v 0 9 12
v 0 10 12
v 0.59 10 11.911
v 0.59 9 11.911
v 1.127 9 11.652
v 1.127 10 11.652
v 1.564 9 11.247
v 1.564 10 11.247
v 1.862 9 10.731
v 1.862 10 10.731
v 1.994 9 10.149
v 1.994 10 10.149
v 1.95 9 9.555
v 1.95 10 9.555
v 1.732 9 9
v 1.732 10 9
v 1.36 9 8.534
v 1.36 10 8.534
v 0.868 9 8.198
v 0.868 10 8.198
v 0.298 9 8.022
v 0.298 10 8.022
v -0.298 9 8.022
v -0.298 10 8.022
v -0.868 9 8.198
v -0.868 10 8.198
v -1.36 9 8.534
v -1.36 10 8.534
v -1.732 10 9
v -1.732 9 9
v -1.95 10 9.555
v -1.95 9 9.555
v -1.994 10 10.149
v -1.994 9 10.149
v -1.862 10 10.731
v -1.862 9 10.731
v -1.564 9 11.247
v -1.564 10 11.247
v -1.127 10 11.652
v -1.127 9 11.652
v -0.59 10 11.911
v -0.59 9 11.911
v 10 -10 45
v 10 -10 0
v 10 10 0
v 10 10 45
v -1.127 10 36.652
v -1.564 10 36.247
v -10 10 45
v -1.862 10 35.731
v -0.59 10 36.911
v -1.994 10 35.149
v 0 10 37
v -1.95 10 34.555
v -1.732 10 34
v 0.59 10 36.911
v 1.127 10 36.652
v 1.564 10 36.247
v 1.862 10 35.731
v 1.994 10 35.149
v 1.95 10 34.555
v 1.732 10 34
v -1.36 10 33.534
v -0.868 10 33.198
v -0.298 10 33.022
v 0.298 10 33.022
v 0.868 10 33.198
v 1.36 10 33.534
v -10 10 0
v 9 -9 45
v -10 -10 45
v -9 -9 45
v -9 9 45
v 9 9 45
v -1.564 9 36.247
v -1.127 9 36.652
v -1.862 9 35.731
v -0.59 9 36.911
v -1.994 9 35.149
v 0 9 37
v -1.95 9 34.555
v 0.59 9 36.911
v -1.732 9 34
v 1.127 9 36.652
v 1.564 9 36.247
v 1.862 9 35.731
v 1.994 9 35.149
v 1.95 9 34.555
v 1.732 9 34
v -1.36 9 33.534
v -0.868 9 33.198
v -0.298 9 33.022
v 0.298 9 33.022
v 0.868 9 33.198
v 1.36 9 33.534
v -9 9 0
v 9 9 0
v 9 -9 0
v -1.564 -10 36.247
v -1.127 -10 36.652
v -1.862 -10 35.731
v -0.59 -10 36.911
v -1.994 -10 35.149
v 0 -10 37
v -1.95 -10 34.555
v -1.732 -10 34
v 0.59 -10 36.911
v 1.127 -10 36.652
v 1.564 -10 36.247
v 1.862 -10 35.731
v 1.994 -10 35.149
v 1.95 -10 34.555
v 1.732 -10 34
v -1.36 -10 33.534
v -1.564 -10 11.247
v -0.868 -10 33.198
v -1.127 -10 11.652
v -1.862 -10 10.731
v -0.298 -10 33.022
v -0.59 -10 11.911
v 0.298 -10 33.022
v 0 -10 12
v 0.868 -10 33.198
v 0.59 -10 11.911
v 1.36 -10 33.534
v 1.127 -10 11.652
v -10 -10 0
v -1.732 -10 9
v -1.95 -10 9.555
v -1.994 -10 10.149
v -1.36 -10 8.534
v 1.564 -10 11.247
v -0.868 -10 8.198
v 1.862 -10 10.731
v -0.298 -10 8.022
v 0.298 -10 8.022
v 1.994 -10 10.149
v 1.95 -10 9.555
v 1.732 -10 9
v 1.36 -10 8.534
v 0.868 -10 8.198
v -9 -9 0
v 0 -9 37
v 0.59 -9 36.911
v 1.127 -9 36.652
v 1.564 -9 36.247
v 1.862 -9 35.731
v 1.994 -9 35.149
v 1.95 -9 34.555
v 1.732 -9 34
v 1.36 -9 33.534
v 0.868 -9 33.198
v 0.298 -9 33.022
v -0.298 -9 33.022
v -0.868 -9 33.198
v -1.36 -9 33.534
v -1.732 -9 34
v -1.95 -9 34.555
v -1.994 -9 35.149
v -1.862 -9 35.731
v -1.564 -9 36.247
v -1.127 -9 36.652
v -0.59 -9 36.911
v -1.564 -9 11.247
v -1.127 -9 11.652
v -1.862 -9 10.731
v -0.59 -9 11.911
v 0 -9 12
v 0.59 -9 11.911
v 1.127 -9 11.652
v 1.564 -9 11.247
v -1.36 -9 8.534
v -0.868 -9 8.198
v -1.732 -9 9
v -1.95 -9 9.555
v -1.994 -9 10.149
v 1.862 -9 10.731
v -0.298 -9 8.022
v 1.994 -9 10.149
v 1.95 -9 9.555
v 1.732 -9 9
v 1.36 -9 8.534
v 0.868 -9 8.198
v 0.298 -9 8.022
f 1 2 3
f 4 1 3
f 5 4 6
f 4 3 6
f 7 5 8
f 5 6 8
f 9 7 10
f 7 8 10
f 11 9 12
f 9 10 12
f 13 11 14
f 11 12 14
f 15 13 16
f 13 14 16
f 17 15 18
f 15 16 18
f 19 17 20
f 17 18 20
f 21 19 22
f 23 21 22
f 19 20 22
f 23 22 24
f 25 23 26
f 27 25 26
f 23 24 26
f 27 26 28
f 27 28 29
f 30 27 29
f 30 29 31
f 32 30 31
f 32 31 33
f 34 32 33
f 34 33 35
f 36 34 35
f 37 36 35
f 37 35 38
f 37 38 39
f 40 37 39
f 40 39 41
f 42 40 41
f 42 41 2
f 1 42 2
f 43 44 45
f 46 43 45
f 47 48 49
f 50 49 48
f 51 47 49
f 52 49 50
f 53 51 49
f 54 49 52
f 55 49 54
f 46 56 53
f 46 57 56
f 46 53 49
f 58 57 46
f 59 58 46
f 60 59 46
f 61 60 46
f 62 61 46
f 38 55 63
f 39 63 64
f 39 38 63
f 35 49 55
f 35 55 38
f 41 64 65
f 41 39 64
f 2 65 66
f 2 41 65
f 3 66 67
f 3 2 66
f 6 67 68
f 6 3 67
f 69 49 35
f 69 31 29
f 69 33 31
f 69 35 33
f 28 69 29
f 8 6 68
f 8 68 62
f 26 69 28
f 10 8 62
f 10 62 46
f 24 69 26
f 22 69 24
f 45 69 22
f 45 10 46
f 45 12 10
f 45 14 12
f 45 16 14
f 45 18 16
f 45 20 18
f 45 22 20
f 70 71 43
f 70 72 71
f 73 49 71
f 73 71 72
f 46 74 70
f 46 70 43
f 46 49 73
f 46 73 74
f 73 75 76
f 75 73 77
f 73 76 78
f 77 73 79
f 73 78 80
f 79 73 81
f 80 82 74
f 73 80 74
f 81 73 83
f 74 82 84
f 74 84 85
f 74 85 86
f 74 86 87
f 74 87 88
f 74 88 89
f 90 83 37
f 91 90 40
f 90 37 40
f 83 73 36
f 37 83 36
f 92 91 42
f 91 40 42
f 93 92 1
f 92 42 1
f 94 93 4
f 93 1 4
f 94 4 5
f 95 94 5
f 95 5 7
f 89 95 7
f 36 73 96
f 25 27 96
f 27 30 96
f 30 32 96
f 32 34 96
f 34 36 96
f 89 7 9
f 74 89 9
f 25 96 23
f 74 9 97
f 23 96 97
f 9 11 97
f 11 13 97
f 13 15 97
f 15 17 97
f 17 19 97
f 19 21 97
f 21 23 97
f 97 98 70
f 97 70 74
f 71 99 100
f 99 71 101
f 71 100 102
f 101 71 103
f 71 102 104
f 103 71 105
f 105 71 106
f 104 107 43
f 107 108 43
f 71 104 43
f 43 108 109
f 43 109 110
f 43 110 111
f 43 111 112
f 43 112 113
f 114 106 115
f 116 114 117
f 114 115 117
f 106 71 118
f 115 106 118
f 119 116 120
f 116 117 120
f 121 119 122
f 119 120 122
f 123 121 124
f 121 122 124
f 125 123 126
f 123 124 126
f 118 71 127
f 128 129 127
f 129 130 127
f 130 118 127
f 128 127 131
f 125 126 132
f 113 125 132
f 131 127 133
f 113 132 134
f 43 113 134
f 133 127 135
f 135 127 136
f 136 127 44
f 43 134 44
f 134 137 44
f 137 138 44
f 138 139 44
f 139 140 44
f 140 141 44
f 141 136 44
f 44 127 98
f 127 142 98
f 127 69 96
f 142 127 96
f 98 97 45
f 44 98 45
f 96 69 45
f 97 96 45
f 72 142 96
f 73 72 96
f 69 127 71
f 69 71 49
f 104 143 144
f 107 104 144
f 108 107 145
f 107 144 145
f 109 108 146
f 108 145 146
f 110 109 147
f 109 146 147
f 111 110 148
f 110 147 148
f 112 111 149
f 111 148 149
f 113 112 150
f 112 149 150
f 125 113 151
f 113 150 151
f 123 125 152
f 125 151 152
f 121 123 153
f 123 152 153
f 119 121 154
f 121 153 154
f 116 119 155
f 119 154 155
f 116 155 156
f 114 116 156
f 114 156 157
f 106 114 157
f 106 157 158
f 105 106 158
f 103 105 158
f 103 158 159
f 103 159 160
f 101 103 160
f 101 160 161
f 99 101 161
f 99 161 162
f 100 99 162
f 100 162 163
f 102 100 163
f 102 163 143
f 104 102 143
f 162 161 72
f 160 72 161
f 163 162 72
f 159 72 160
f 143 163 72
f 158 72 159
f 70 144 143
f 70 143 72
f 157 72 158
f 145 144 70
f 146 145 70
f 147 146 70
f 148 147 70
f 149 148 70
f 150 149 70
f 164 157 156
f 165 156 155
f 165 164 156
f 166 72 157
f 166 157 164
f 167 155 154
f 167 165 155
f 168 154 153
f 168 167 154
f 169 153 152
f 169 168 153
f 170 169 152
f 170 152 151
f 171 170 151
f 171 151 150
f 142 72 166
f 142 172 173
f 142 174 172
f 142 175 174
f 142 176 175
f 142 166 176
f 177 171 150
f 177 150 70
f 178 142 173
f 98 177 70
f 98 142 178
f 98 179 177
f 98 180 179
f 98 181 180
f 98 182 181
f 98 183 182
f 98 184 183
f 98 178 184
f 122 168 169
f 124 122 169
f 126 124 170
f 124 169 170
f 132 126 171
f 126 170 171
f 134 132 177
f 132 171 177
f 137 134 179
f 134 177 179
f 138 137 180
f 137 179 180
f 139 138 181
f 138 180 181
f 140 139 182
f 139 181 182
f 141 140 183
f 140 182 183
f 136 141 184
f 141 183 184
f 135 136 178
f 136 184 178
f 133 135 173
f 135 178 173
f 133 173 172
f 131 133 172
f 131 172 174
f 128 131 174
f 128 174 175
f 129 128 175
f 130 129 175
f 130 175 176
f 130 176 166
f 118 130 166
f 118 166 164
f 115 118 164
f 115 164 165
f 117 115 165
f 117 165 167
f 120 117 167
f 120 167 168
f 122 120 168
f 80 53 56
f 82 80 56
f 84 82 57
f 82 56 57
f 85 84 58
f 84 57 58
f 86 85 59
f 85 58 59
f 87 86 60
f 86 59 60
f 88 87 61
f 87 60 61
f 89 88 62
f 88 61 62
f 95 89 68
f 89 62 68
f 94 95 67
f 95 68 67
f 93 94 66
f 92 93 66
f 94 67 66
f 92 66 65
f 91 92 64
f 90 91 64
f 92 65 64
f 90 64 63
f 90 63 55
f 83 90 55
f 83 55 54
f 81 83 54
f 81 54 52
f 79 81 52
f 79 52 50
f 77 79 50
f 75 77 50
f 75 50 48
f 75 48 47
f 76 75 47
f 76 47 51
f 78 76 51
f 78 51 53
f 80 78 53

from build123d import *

# Parameters (mm, degrees)
SKETCH_1_W          = 20
SKETCH_1_H          = 20
SKETCH_1_W_2        = 18
SKETCH_1_H_2        = 18
EXTRUDE_1_DEPTH     = 45
CUT_EXTRUDE_1_REACH = 52.249
SKETCH_2_R          = 2


with BuildPart() as part:
    # 草图1 → 凸台-拉伸1 (new body)
    with BuildSketch(Plane.XY):
        Rectangle(SKETCH_1_W, SKETCH_1_H)
        Rectangle(SKETCH_1_W_2, SKETCH_1_H_2, mode=Mode.SUBTRACT)
    extrude(amount=EXTRUDE_1_DEPTH)

    # 切除-拉伸1: up to this face of the body (flat: up to its plane)
    cut_extrude_1_end = Plane(part.part.faces().sort_by_distance((0, -10, 22.5))[0])
    # 草图2 → 切除-拉伸1 (cut, up to the picked face)
    with BuildSketch(Plane(origin=(0, 10, 0), x_dir=(1, 0, 0), z_dir=(0, 1, 0)), mode=Mode.PRIVATE) as cut_extrude_1_sk1:
        with Locations(Location((0, -10, 0), (0, 0, 270))):
            Circle(SKETCH_2_R)
    cut_extrude_1_tool1 = split(extrude(cut_extrude_1_sk1.sketch, amount=-CUT_EXTRUDE_1_REACH, mode=Mode.PRIVATE), bisect_by=cut_extrude_1_end, keep=Keep.BOTH, mode=Mode.PRIVATE)
    # 草图2 → 切除-拉伸1 (cut, up to the picked face)
    with BuildSketch(Plane(origin=(0, 10, 0), x_dir=(1, 0, 0), z_dir=(0, 1, 0)), mode=Mode.PRIVATE) as cut_extrude_1_sk2:
        with Locations(Location((0, -35, 0), (0, 0, 270))):
            Circle(SKETCH_2_R)
    cut_extrude_1_tool2 = split(extrude(cut_extrude_1_sk2.sketch, amount=-CUT_EXTRUDE_1_REACH, mode=Mode.PRIVATE), bisect_by=cut_extrude_1_end, keep=Keep.BOTH, mode=Mode.PRIVATE)
    add(cut_extrude_1_tool1.solids().sort_by(Axis((0, 10, 10), (0, -1, 0)))[0], mode=Mode.SUBTRACT)
    add(cut_extrude_1_tool2.solids().sort_by(Axis((0, 10, 35), (0, -1, 0)))[0], mode=Mode.SUBTRACT)


solid = part.part
